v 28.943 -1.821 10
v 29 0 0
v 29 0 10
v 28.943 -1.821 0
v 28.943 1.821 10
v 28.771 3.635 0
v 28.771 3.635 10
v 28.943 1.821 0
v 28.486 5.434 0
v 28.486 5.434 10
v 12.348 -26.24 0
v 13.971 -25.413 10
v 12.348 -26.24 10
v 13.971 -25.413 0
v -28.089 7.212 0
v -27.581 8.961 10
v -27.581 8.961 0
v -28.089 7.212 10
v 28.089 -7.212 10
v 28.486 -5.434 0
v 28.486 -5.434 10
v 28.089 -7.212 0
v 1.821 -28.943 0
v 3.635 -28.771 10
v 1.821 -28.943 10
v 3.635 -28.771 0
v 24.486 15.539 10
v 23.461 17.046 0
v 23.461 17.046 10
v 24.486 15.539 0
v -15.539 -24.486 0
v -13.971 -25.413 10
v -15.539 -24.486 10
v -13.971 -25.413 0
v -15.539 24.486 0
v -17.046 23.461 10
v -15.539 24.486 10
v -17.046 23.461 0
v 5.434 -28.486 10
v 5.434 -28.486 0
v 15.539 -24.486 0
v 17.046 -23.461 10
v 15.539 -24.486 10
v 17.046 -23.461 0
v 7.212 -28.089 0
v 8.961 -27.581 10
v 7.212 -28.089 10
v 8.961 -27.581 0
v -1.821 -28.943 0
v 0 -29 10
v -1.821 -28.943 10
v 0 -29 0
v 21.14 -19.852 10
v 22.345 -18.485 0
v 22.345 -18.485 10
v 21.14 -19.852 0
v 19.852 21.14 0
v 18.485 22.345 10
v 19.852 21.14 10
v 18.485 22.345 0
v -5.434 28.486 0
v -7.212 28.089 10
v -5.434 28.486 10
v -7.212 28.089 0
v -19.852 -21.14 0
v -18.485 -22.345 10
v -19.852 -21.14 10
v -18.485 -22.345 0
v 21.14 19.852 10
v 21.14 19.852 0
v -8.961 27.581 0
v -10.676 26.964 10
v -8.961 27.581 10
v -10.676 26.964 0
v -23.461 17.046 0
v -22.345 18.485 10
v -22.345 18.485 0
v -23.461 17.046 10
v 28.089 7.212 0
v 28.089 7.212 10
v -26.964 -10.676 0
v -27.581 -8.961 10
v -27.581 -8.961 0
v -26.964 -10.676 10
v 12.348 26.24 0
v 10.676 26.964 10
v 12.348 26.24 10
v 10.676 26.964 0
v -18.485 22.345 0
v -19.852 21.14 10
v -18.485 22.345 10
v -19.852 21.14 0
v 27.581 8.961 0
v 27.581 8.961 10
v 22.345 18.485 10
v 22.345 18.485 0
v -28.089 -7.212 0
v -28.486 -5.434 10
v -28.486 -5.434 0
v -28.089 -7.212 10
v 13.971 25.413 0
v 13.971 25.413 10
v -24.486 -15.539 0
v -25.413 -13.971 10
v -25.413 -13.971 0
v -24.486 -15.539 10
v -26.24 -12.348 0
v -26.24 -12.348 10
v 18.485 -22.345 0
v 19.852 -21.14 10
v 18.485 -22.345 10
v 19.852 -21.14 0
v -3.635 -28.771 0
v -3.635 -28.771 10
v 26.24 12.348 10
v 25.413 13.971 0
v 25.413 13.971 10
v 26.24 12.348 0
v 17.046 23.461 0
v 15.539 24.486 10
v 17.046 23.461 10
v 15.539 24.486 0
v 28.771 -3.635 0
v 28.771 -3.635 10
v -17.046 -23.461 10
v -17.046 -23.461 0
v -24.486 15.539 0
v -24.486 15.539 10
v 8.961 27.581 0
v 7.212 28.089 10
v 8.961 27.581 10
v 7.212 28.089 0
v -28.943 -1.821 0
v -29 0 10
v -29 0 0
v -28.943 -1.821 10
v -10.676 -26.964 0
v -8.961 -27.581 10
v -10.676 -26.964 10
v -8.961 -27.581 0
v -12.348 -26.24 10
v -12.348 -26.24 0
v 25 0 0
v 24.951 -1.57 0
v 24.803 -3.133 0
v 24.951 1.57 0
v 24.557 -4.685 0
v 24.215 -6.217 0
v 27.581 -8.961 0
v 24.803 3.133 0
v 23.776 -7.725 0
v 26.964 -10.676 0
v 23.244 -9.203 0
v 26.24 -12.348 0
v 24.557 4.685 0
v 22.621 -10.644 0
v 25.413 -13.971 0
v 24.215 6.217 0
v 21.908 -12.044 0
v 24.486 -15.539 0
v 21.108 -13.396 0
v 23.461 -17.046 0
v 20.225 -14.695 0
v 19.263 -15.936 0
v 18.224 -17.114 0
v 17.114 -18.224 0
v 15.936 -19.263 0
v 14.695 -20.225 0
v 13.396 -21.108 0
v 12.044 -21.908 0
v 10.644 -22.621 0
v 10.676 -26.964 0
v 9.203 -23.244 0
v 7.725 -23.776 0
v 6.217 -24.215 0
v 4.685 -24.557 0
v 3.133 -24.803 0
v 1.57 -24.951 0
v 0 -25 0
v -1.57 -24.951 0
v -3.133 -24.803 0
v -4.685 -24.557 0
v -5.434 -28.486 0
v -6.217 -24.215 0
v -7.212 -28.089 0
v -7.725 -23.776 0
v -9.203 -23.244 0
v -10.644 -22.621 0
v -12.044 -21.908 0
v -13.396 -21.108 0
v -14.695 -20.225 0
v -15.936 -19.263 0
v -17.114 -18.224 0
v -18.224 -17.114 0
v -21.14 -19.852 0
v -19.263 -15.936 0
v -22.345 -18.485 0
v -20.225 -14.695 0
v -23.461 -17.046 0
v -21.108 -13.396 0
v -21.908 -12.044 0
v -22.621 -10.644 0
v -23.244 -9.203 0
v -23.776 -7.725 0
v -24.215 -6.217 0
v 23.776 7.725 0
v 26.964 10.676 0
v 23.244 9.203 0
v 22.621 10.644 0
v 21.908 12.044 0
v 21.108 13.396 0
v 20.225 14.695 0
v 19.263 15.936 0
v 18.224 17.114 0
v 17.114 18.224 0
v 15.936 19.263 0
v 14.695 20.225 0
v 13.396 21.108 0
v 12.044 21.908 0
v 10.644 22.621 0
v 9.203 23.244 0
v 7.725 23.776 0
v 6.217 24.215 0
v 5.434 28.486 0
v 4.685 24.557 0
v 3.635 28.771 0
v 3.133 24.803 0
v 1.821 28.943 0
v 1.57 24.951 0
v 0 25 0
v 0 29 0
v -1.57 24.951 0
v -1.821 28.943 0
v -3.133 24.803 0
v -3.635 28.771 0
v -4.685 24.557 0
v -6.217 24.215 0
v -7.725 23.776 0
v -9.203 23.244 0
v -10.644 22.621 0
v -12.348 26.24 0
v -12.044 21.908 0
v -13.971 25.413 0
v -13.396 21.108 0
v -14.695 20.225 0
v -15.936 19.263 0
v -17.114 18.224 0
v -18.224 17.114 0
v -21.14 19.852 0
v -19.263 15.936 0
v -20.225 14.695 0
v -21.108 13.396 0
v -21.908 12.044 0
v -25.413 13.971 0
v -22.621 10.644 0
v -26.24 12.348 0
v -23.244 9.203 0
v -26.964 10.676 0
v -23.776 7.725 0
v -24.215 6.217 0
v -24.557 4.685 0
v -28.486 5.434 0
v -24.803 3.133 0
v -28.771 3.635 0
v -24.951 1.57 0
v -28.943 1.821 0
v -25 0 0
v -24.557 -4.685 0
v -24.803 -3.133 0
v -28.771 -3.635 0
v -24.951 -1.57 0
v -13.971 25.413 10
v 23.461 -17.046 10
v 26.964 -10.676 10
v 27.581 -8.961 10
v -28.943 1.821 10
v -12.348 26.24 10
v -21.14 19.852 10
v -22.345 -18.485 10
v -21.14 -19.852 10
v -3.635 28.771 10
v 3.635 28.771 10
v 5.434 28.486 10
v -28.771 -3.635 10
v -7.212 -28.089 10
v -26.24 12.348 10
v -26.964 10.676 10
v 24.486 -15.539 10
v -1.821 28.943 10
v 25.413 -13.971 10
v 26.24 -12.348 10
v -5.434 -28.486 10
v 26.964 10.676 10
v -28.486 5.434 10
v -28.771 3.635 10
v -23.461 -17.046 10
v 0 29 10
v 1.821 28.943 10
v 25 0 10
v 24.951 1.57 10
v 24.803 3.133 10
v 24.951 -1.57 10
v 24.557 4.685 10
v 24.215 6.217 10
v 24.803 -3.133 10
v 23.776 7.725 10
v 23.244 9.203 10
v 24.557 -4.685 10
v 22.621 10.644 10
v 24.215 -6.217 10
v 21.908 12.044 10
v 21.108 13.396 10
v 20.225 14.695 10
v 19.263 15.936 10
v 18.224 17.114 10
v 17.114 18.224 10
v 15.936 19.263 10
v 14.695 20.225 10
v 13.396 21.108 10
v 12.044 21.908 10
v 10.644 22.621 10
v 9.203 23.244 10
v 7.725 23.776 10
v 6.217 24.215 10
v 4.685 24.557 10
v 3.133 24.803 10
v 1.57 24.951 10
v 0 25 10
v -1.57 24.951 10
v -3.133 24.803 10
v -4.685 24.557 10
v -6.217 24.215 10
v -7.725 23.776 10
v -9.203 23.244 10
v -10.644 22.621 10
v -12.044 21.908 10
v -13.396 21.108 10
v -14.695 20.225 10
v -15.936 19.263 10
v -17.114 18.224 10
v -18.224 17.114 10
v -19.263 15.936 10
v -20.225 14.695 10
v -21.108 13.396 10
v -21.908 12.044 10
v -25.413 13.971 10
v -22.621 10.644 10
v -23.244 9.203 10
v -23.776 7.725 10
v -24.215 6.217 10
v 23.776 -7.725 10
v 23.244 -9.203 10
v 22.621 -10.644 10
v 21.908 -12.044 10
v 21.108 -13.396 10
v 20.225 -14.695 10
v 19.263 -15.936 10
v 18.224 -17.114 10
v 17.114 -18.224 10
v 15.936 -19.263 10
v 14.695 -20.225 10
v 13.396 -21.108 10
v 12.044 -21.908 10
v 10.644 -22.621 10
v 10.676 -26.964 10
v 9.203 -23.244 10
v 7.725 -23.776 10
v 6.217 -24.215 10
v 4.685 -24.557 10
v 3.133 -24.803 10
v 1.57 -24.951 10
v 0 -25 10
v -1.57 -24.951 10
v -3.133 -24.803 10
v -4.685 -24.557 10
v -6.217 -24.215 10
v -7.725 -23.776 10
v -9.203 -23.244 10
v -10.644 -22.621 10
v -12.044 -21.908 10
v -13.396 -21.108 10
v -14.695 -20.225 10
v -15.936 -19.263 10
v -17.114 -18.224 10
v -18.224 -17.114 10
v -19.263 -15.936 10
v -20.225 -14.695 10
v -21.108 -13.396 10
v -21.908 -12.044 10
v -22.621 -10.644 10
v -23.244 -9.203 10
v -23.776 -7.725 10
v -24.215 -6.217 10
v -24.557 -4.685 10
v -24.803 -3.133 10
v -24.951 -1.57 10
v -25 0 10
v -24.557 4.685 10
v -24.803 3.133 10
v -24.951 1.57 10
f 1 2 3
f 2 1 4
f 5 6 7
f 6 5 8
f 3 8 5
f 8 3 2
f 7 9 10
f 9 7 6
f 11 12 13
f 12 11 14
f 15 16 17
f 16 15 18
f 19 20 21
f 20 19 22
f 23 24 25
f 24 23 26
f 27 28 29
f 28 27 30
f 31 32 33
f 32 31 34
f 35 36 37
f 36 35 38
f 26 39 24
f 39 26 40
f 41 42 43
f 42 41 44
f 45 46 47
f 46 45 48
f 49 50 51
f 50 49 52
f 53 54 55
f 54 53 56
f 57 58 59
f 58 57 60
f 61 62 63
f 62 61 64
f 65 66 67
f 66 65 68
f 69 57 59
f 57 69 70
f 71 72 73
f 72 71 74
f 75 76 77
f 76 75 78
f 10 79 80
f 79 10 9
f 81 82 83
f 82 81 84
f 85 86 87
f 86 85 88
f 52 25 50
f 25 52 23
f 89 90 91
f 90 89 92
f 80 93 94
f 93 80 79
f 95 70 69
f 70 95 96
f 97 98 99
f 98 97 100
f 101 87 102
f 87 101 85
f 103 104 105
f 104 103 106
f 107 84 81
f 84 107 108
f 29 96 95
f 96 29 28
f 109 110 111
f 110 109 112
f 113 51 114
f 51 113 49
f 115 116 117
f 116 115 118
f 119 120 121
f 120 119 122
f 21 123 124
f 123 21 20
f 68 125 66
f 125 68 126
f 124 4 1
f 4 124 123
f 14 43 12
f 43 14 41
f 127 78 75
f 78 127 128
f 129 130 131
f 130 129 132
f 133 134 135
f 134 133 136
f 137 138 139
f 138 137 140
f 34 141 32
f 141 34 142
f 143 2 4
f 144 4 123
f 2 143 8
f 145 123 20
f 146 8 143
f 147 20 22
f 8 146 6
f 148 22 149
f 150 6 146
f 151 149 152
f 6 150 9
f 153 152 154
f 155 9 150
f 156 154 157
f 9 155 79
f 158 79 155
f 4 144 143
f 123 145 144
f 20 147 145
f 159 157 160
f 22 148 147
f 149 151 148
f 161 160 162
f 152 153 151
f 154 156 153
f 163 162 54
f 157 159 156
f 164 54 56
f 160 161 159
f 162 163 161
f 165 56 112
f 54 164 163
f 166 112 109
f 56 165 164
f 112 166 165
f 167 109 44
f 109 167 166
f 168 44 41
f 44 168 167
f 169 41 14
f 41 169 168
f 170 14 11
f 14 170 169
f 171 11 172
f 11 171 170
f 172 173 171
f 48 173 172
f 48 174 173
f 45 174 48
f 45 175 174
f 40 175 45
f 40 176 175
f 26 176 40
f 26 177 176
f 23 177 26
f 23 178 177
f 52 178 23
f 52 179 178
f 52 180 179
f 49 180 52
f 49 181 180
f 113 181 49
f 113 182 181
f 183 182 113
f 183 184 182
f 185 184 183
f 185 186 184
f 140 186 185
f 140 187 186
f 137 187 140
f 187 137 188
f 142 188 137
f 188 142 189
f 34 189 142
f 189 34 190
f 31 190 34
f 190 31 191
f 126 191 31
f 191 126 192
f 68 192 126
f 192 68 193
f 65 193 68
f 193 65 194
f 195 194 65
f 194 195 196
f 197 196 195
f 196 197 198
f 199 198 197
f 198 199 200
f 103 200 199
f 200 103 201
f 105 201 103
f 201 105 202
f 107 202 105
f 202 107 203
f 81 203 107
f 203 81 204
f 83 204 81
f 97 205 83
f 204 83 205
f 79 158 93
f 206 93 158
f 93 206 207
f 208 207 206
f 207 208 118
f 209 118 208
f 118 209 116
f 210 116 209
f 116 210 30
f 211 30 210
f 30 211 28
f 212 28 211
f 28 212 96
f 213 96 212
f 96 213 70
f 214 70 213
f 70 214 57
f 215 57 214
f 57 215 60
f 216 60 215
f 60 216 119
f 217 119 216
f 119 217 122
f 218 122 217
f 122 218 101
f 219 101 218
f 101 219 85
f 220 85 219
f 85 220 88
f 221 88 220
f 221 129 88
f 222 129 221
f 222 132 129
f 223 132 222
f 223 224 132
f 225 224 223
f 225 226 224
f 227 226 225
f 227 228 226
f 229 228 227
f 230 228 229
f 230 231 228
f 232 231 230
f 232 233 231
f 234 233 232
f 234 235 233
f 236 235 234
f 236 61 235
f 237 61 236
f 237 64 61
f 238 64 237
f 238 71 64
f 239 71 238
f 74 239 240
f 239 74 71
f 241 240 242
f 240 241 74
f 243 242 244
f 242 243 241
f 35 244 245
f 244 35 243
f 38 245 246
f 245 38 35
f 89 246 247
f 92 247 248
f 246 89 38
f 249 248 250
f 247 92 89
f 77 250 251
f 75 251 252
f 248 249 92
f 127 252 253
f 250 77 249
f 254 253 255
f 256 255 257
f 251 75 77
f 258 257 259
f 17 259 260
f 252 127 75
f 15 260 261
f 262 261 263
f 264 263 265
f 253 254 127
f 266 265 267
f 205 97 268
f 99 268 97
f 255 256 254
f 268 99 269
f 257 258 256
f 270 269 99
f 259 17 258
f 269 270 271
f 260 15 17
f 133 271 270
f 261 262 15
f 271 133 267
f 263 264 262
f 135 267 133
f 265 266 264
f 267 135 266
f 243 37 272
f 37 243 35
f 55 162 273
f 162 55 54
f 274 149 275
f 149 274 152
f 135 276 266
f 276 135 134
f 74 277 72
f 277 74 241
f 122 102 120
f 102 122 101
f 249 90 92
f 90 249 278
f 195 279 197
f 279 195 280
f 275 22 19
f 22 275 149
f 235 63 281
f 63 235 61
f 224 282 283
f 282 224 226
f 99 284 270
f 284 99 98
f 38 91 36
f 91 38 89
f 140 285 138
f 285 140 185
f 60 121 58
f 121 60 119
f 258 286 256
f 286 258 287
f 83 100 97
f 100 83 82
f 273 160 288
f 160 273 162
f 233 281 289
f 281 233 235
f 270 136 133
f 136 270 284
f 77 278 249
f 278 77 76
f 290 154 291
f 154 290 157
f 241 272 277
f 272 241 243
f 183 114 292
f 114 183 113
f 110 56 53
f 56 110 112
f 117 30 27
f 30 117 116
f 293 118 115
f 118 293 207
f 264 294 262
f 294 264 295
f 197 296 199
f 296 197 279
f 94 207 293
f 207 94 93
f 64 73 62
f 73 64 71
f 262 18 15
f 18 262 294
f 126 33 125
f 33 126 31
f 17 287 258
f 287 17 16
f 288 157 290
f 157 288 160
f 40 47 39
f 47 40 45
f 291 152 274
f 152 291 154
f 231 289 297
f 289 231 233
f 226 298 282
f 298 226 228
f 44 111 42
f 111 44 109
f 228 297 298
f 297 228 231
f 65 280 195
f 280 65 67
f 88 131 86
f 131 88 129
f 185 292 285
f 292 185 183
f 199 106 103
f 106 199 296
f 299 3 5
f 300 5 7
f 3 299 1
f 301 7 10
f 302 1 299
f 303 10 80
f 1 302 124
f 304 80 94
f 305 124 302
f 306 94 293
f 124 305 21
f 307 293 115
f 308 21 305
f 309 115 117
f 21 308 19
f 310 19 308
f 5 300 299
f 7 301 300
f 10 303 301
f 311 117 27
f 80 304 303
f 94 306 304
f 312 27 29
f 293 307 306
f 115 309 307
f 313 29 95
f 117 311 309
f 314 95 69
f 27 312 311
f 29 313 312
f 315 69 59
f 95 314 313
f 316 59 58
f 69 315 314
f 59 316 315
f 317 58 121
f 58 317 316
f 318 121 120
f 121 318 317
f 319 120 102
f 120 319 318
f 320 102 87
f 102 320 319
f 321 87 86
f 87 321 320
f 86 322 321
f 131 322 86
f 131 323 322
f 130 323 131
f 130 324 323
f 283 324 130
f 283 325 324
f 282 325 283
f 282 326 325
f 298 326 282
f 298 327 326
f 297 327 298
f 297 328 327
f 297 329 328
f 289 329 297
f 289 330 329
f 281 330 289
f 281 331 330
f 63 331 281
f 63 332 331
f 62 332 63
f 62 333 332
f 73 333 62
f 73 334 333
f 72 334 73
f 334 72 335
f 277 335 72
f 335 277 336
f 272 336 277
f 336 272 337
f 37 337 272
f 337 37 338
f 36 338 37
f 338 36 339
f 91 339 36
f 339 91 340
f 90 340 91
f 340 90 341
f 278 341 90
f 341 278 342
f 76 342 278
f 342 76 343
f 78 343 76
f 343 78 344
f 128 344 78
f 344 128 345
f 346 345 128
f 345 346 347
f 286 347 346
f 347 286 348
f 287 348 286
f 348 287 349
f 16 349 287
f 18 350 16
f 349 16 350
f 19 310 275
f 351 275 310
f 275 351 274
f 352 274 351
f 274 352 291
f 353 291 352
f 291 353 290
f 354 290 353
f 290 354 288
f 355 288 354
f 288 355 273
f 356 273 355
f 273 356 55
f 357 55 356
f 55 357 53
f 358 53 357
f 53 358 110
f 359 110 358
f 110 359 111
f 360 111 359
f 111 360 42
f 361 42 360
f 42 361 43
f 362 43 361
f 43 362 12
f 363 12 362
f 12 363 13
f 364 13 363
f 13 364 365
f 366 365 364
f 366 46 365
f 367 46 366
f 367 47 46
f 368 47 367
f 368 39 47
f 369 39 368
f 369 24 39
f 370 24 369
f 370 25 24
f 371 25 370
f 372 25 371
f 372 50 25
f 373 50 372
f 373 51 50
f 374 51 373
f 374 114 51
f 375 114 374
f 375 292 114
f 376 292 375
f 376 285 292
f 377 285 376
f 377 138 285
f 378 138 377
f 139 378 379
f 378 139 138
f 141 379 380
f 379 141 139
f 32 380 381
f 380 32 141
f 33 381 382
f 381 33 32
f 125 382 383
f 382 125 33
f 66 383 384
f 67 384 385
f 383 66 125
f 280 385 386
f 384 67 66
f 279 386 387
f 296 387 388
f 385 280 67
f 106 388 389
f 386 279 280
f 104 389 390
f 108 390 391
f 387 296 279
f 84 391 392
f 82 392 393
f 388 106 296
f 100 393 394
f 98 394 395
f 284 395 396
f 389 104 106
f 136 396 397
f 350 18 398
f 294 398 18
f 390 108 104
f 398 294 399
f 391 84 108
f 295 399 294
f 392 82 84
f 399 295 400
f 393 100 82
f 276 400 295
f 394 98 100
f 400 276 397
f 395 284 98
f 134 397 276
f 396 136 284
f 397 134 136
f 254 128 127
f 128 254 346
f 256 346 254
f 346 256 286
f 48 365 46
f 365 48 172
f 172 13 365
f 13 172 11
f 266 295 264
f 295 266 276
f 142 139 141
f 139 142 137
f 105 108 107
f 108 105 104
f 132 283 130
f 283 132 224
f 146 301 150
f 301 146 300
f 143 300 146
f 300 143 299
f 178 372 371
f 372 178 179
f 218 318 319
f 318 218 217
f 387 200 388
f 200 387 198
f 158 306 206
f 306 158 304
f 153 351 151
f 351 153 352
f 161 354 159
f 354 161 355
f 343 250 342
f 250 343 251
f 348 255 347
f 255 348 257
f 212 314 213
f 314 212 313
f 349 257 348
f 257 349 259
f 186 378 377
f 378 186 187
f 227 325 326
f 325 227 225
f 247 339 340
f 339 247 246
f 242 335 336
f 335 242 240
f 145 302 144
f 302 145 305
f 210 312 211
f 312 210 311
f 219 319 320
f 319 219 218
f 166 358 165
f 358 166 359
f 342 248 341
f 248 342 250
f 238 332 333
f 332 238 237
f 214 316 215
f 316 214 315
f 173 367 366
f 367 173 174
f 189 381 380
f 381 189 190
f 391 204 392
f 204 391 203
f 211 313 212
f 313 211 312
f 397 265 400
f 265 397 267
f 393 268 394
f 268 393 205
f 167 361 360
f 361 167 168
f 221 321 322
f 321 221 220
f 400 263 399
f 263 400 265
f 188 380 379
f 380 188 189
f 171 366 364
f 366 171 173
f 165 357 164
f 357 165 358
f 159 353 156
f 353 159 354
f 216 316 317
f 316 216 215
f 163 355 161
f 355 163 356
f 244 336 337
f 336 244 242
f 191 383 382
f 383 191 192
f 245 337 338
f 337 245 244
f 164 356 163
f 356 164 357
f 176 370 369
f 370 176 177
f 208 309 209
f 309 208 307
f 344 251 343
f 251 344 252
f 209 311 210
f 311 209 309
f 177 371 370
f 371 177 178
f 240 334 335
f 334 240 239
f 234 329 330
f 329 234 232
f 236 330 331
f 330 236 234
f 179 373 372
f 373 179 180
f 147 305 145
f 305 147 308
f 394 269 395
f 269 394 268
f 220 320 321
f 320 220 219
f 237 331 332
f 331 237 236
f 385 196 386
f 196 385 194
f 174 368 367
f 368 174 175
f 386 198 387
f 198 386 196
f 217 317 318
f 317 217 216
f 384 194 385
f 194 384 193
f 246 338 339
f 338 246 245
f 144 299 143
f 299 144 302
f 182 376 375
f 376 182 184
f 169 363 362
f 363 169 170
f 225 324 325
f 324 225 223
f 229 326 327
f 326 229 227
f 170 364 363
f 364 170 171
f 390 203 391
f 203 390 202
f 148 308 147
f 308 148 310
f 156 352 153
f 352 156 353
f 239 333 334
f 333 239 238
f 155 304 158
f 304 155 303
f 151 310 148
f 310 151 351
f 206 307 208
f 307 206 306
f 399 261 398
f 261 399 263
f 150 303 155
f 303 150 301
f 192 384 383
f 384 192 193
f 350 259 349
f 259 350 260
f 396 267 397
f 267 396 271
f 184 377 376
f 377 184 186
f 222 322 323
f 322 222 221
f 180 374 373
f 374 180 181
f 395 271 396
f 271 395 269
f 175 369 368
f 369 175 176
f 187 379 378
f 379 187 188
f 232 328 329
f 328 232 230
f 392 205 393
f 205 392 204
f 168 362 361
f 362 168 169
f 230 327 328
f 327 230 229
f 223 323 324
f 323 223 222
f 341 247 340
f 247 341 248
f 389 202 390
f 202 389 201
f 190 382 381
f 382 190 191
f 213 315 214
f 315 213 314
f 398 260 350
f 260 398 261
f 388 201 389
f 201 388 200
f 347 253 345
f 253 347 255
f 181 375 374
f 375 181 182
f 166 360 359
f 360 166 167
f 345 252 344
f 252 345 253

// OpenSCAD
use <WriteSVG.scad>


// Aro
module aro(grosor_aro=10,  diam_ext=58, diam_int = 50, texto = "Gonzalo")
{
 // Exterior Aro
 difference(){
    cylinder(r=diam_ext/2,h=grosor_aro,  $fn=100);
    //-- Taladro aro
   cylinder(r=diam_int/2, h=grosor_aro*3,$fn=100,center=true);
 }
	//Letras
	writecylinder(texto,[0,0,0],diam_ext/2,grosor_aro);

}

aro();
